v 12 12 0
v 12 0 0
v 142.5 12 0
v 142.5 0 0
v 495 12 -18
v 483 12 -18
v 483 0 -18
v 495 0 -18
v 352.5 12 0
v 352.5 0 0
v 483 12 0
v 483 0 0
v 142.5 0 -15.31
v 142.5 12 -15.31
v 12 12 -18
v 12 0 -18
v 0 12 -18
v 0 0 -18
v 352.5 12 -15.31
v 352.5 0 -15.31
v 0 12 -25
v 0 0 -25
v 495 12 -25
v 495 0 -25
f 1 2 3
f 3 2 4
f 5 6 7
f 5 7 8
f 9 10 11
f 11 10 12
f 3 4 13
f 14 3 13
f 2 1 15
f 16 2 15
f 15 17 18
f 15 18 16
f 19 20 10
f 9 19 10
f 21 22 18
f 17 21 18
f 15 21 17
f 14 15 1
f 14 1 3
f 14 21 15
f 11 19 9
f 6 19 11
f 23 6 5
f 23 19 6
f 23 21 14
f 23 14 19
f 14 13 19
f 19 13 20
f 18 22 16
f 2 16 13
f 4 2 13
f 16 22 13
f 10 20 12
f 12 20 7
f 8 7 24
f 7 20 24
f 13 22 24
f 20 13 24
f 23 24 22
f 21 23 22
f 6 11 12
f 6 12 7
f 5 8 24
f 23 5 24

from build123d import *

# Parameters (mm, degrees)
BOSS_EXTRUDE1_DEPTH = 12
SKETCH3_W           = 12
SKETCH3_H           = 18
CUT_EXTRUDE1_DEPTH  = 12


with BuildPart() as part:
    # Sketch2 → Boss-Extrude1 (new body)
    with BuildSketch(Plane(origin=(0, 0, 0), x_dir=(1, 0, 0), z_dir=(0, 1, 0))):
        Polygon((0, 25), (0, 0), (142.5, 0), (142.5, 15.309556752), (352.5, 15.309556752), (352.5, 0), (495, 0), (495, 25), align=None)
    extrude(amount=BOSS_EXTRUDE1_DEPTH)

    # Sketch3 → Cut-Extrude1 (cut)
    with BuildSketch(Plane(origin=(0, 12, 0), x_dir=(1, 0, 0), z_dir=(0, 1, 0))):
        with Locations((6, 9)):
            Rectangle(SKETCH3_W, SKETCH3_H)
        with Locations((489, 9)):
            Rectangle(SKETCH3_W, SKETCH3_H)
    extrude(amount=-CUT_EXTRUDE1_DEPTH, mode=Mode.SUBTRACT)


solid = part.part
